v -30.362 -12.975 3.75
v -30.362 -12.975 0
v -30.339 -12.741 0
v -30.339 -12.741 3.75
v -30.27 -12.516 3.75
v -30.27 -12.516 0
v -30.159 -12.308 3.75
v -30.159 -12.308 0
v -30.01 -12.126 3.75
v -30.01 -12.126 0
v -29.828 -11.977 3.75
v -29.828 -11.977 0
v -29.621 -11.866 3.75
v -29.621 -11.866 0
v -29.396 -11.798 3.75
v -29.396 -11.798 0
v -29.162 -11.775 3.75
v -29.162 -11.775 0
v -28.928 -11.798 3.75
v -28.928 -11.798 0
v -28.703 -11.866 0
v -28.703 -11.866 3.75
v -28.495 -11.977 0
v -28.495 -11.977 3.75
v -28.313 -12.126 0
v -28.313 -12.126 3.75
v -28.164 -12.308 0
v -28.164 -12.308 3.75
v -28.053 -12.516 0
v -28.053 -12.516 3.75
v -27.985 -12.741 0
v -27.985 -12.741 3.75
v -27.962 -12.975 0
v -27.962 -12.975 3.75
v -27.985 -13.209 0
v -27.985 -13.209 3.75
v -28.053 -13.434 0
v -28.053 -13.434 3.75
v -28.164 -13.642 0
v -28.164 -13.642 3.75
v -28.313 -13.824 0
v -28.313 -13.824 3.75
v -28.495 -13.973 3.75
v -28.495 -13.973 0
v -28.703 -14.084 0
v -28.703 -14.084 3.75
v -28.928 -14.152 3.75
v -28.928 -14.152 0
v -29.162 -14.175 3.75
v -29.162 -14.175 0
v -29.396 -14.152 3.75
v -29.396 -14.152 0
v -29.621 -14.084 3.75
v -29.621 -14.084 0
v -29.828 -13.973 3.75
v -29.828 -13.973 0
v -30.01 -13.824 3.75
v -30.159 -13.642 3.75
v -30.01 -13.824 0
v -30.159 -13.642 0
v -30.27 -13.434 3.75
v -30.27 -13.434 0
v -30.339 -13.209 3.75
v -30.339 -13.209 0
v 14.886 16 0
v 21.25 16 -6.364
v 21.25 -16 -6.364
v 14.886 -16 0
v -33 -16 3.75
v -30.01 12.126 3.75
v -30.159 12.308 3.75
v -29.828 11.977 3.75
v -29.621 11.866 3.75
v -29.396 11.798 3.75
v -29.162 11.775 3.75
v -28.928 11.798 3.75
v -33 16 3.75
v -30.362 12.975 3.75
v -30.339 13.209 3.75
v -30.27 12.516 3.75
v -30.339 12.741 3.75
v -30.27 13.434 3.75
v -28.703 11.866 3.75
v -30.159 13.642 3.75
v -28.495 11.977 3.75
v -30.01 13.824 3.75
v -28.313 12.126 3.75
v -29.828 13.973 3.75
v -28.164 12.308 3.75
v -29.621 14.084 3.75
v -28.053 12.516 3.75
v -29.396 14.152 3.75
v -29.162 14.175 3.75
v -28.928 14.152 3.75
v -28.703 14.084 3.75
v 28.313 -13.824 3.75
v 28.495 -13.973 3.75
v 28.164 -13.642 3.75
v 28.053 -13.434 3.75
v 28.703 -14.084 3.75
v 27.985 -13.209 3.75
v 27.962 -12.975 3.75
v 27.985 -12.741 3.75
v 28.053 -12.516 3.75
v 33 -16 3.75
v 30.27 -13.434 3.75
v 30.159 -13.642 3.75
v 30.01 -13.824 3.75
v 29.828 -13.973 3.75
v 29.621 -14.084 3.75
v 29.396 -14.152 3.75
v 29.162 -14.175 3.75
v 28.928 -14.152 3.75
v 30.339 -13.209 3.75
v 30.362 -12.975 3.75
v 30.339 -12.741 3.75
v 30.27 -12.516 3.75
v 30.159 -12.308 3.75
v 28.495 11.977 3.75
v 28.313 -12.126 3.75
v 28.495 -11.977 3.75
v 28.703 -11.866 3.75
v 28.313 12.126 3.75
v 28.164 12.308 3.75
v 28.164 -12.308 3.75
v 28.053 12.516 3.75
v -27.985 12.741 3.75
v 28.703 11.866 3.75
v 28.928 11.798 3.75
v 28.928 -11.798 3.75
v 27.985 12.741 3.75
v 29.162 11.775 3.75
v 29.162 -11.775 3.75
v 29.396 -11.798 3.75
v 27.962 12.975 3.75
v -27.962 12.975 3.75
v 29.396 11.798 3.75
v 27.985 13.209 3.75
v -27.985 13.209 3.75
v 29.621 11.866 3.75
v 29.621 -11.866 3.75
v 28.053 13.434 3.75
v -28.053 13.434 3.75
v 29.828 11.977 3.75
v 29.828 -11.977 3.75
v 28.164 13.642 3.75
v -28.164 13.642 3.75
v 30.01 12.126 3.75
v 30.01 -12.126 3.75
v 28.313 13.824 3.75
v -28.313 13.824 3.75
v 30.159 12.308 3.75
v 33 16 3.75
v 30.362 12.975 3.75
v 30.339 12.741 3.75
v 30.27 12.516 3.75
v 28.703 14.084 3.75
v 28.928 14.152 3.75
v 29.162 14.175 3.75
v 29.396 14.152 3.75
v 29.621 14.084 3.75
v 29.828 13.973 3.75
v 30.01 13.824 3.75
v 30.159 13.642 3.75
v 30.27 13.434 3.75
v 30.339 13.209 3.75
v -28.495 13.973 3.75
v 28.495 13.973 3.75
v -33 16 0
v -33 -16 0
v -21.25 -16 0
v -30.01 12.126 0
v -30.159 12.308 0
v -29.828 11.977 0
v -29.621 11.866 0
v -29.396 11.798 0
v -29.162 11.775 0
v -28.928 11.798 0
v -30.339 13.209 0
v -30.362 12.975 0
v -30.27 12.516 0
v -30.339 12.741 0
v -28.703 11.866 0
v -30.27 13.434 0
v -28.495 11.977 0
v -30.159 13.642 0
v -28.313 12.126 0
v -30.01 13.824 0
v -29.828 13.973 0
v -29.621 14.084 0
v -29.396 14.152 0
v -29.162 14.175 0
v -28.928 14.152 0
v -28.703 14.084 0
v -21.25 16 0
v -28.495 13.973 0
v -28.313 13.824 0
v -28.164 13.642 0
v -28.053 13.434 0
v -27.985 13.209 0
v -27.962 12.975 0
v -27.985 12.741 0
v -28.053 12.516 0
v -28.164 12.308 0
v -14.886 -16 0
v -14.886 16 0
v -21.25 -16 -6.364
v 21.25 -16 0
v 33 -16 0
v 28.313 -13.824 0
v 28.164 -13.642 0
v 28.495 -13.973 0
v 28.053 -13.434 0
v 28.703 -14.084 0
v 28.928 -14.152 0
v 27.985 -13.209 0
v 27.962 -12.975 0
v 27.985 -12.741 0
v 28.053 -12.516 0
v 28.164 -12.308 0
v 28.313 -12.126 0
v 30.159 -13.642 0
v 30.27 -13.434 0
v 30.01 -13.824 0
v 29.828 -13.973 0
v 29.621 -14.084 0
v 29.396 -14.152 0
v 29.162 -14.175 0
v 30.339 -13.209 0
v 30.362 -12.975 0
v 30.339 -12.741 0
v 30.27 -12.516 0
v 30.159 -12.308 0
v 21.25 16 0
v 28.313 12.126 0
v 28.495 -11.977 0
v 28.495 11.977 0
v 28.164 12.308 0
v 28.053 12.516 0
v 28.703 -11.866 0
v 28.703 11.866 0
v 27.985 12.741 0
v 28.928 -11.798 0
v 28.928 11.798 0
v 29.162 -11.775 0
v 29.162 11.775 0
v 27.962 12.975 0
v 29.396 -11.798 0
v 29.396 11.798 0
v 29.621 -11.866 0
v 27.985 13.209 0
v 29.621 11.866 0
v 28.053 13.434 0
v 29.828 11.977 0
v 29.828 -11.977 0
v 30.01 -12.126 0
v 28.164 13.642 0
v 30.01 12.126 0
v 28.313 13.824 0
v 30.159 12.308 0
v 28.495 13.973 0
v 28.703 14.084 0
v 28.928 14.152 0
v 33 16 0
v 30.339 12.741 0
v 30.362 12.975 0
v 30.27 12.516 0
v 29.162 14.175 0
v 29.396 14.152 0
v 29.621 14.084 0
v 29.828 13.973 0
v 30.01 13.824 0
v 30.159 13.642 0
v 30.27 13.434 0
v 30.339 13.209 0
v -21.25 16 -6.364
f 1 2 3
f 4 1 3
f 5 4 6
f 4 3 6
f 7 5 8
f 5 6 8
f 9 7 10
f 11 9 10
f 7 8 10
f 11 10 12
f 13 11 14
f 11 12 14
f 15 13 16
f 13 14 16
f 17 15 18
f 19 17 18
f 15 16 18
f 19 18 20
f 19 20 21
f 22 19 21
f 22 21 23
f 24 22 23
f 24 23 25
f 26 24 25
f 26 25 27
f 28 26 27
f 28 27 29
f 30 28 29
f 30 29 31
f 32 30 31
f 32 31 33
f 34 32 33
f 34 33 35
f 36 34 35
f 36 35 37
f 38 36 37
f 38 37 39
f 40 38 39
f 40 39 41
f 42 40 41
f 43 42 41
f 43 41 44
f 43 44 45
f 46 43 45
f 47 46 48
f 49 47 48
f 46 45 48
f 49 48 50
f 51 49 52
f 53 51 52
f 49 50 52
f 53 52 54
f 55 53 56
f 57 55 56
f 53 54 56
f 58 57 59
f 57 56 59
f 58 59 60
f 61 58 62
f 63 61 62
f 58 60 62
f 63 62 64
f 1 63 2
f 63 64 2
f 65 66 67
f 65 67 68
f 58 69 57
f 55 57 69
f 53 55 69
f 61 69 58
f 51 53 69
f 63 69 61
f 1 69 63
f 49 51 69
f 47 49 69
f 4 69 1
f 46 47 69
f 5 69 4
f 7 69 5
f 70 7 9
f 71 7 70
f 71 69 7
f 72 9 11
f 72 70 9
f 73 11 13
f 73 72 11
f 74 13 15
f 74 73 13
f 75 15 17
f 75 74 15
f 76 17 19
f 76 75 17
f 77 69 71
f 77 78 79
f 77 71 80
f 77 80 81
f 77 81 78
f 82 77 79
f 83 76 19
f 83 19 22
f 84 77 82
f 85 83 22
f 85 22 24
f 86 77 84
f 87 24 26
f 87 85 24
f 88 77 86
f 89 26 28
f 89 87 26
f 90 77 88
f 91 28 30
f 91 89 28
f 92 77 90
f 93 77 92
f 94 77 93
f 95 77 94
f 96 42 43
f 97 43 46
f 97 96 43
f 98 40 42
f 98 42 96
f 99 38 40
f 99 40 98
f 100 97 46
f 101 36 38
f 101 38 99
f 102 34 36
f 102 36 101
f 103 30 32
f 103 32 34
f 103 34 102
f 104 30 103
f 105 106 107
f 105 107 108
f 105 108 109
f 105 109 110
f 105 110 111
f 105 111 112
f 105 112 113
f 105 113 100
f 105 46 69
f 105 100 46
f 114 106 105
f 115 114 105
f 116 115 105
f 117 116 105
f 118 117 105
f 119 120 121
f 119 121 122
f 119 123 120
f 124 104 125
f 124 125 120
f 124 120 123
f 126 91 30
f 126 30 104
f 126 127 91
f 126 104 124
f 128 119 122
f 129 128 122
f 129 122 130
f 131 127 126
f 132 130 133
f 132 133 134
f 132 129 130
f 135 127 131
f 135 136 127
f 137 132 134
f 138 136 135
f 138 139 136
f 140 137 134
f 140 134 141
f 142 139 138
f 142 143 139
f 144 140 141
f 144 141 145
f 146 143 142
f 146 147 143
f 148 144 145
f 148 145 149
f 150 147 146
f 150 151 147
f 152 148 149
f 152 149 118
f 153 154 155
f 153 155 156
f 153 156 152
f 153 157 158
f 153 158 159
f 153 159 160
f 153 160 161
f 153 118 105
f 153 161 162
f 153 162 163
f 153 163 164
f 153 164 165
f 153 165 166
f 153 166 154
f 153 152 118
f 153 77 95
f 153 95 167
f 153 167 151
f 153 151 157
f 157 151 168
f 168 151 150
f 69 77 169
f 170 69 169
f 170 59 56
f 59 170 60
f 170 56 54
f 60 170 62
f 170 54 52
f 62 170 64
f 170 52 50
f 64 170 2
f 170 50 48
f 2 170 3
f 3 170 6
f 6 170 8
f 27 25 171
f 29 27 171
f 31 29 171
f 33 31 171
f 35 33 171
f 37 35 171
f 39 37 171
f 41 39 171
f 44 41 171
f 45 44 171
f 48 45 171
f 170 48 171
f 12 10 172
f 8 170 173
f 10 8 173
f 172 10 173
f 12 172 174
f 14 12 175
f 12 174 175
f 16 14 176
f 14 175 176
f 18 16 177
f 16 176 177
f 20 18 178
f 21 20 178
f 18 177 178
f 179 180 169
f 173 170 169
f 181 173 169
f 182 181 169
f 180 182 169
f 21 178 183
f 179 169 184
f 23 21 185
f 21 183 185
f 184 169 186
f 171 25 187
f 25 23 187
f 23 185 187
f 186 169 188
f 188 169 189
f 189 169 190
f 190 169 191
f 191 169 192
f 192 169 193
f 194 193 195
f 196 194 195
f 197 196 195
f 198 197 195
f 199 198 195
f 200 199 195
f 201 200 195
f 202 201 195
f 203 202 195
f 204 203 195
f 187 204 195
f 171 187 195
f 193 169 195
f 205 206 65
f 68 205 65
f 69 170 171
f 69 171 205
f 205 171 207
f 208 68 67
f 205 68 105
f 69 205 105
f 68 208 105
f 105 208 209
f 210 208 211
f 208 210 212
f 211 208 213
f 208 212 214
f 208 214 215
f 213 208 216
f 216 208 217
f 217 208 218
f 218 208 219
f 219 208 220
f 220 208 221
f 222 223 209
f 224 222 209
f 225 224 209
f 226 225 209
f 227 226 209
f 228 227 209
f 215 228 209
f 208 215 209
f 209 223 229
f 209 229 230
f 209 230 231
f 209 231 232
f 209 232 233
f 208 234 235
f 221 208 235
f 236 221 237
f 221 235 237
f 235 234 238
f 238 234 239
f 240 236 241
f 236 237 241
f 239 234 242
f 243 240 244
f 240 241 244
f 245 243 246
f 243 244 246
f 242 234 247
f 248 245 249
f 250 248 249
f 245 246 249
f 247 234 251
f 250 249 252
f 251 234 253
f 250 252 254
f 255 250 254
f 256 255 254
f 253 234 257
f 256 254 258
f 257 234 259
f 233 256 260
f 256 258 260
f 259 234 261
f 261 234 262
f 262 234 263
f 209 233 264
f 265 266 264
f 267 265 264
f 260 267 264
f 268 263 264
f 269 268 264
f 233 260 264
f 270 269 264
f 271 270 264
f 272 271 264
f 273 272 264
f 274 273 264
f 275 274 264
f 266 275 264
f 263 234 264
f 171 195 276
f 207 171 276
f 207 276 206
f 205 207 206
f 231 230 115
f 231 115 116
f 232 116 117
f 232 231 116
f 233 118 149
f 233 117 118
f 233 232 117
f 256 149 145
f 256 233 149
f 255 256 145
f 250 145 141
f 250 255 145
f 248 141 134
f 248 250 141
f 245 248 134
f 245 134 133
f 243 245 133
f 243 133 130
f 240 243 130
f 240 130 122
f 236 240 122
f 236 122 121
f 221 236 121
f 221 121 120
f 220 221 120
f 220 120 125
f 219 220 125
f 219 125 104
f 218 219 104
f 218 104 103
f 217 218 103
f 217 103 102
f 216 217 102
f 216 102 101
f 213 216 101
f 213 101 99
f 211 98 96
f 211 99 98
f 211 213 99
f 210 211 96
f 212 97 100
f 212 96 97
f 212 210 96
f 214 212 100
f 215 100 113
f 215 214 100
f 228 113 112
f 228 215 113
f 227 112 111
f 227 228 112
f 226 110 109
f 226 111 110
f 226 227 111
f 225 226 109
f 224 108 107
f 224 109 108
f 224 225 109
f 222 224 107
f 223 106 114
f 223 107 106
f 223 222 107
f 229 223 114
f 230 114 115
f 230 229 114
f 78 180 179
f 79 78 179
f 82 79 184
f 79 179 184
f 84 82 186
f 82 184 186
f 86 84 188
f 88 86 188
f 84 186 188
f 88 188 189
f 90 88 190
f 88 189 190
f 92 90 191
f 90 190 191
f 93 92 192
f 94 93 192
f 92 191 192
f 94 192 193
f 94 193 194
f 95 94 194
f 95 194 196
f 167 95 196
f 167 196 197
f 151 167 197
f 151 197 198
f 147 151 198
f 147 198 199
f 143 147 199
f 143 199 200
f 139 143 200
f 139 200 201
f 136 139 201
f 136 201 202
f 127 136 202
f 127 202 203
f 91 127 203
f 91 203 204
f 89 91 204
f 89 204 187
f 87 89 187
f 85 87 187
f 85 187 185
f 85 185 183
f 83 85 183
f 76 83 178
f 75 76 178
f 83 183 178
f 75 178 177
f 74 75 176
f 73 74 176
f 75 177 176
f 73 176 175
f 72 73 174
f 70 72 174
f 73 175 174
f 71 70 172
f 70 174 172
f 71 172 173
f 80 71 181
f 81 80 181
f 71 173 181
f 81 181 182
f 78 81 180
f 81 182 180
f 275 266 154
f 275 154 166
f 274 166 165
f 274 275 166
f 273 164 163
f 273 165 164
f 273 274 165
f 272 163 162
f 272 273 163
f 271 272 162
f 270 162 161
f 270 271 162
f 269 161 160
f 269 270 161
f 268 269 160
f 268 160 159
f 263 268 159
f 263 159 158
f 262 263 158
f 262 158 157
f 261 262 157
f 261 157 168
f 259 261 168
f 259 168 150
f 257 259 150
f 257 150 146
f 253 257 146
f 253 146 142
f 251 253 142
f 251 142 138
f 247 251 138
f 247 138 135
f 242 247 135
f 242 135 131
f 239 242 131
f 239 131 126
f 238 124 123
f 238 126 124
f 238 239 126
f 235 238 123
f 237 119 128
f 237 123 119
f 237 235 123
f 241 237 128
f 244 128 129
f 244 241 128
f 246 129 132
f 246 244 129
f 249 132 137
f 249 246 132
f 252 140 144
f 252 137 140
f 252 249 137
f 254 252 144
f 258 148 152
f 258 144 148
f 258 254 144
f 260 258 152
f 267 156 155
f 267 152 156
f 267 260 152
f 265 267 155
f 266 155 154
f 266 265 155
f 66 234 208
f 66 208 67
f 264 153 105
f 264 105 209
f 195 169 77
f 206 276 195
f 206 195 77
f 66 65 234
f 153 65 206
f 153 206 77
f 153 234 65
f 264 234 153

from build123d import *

# Parameters (mm, degrees)
SKETCH1_W            = 50
SKETCH1_H            = 32
BOSS_EXTRUDE1_DEPTH  = 3.75
BOSS_EXTRUDE2_DEPTH  = 32
SKETCH4_W            = 8
SKETCH4_H            = 3.75
BOSS_EXTRUDE3_DEPTH  = 32
M2_CLEARANCE_HOLE1_D = 2.4


with BuildPart() as part:
    # Sketch1 → Boss-Extrude1 (new body)
    with BuildSketch(Plane.XY):
        Rectangle(SKETCH1_W, SKETCH1_H)
    extrude(amount=BOSS_EXTRUDE1_DEPTH)

    # Sketch2 → Boss-Extrude2 (add)
    with BuildSketch(Plane(origin=(0, 16, 0), x_dir=(1, 0, 0), z_dir=(0, 1, 0))):
        Polygon((-21.25, 0), (-21.25, 6.363961031), (-14.886038969, 0), align=None)
        Polygon((14.886038969, 0), (21.25, 0), (21.25, 6.363961031), align=None)
    extrude(amount=-BOSS_EXTRUDE2_DEPTH)

    # Sketch4 → Boss-Extrude3 (add)
    with BuildSketch(Plane(origin=(0, 16, 0), x_dir=(1, 0, 0), z_dir=(0, 1, 0))):
        with Locations((29, -1.875)):
            Rectangle(SKETCH4_W, SKETCH4_H)
        with Locations((-29, -1.875)):
            Rectangle(SKETCH4_W, SKETCH4_H)
    extrude(amount=-BOSS_EXTRUDE3_DEPTH)

    # M2 Clearance Hole1 (through all)
    with Locations(Plane.XY.offset(3.75)):
        with Locations((-29.16173141, -12.975), (-29.16173141, 12.975)):
            m2_clearance_hole1 = Hole(M2_CLEARANCE_HOLE1_D / 2)

    # Mirror1: M2 Clearance Hole1 across plane
    add(m2_clearance_hole1.mirror(Plane(origin=(0, 0, 0), x_dir=(0, 0, 1), z_dir=(1, 0, 0))), mode=Mode.SUBTRACT)


solid = part.part
